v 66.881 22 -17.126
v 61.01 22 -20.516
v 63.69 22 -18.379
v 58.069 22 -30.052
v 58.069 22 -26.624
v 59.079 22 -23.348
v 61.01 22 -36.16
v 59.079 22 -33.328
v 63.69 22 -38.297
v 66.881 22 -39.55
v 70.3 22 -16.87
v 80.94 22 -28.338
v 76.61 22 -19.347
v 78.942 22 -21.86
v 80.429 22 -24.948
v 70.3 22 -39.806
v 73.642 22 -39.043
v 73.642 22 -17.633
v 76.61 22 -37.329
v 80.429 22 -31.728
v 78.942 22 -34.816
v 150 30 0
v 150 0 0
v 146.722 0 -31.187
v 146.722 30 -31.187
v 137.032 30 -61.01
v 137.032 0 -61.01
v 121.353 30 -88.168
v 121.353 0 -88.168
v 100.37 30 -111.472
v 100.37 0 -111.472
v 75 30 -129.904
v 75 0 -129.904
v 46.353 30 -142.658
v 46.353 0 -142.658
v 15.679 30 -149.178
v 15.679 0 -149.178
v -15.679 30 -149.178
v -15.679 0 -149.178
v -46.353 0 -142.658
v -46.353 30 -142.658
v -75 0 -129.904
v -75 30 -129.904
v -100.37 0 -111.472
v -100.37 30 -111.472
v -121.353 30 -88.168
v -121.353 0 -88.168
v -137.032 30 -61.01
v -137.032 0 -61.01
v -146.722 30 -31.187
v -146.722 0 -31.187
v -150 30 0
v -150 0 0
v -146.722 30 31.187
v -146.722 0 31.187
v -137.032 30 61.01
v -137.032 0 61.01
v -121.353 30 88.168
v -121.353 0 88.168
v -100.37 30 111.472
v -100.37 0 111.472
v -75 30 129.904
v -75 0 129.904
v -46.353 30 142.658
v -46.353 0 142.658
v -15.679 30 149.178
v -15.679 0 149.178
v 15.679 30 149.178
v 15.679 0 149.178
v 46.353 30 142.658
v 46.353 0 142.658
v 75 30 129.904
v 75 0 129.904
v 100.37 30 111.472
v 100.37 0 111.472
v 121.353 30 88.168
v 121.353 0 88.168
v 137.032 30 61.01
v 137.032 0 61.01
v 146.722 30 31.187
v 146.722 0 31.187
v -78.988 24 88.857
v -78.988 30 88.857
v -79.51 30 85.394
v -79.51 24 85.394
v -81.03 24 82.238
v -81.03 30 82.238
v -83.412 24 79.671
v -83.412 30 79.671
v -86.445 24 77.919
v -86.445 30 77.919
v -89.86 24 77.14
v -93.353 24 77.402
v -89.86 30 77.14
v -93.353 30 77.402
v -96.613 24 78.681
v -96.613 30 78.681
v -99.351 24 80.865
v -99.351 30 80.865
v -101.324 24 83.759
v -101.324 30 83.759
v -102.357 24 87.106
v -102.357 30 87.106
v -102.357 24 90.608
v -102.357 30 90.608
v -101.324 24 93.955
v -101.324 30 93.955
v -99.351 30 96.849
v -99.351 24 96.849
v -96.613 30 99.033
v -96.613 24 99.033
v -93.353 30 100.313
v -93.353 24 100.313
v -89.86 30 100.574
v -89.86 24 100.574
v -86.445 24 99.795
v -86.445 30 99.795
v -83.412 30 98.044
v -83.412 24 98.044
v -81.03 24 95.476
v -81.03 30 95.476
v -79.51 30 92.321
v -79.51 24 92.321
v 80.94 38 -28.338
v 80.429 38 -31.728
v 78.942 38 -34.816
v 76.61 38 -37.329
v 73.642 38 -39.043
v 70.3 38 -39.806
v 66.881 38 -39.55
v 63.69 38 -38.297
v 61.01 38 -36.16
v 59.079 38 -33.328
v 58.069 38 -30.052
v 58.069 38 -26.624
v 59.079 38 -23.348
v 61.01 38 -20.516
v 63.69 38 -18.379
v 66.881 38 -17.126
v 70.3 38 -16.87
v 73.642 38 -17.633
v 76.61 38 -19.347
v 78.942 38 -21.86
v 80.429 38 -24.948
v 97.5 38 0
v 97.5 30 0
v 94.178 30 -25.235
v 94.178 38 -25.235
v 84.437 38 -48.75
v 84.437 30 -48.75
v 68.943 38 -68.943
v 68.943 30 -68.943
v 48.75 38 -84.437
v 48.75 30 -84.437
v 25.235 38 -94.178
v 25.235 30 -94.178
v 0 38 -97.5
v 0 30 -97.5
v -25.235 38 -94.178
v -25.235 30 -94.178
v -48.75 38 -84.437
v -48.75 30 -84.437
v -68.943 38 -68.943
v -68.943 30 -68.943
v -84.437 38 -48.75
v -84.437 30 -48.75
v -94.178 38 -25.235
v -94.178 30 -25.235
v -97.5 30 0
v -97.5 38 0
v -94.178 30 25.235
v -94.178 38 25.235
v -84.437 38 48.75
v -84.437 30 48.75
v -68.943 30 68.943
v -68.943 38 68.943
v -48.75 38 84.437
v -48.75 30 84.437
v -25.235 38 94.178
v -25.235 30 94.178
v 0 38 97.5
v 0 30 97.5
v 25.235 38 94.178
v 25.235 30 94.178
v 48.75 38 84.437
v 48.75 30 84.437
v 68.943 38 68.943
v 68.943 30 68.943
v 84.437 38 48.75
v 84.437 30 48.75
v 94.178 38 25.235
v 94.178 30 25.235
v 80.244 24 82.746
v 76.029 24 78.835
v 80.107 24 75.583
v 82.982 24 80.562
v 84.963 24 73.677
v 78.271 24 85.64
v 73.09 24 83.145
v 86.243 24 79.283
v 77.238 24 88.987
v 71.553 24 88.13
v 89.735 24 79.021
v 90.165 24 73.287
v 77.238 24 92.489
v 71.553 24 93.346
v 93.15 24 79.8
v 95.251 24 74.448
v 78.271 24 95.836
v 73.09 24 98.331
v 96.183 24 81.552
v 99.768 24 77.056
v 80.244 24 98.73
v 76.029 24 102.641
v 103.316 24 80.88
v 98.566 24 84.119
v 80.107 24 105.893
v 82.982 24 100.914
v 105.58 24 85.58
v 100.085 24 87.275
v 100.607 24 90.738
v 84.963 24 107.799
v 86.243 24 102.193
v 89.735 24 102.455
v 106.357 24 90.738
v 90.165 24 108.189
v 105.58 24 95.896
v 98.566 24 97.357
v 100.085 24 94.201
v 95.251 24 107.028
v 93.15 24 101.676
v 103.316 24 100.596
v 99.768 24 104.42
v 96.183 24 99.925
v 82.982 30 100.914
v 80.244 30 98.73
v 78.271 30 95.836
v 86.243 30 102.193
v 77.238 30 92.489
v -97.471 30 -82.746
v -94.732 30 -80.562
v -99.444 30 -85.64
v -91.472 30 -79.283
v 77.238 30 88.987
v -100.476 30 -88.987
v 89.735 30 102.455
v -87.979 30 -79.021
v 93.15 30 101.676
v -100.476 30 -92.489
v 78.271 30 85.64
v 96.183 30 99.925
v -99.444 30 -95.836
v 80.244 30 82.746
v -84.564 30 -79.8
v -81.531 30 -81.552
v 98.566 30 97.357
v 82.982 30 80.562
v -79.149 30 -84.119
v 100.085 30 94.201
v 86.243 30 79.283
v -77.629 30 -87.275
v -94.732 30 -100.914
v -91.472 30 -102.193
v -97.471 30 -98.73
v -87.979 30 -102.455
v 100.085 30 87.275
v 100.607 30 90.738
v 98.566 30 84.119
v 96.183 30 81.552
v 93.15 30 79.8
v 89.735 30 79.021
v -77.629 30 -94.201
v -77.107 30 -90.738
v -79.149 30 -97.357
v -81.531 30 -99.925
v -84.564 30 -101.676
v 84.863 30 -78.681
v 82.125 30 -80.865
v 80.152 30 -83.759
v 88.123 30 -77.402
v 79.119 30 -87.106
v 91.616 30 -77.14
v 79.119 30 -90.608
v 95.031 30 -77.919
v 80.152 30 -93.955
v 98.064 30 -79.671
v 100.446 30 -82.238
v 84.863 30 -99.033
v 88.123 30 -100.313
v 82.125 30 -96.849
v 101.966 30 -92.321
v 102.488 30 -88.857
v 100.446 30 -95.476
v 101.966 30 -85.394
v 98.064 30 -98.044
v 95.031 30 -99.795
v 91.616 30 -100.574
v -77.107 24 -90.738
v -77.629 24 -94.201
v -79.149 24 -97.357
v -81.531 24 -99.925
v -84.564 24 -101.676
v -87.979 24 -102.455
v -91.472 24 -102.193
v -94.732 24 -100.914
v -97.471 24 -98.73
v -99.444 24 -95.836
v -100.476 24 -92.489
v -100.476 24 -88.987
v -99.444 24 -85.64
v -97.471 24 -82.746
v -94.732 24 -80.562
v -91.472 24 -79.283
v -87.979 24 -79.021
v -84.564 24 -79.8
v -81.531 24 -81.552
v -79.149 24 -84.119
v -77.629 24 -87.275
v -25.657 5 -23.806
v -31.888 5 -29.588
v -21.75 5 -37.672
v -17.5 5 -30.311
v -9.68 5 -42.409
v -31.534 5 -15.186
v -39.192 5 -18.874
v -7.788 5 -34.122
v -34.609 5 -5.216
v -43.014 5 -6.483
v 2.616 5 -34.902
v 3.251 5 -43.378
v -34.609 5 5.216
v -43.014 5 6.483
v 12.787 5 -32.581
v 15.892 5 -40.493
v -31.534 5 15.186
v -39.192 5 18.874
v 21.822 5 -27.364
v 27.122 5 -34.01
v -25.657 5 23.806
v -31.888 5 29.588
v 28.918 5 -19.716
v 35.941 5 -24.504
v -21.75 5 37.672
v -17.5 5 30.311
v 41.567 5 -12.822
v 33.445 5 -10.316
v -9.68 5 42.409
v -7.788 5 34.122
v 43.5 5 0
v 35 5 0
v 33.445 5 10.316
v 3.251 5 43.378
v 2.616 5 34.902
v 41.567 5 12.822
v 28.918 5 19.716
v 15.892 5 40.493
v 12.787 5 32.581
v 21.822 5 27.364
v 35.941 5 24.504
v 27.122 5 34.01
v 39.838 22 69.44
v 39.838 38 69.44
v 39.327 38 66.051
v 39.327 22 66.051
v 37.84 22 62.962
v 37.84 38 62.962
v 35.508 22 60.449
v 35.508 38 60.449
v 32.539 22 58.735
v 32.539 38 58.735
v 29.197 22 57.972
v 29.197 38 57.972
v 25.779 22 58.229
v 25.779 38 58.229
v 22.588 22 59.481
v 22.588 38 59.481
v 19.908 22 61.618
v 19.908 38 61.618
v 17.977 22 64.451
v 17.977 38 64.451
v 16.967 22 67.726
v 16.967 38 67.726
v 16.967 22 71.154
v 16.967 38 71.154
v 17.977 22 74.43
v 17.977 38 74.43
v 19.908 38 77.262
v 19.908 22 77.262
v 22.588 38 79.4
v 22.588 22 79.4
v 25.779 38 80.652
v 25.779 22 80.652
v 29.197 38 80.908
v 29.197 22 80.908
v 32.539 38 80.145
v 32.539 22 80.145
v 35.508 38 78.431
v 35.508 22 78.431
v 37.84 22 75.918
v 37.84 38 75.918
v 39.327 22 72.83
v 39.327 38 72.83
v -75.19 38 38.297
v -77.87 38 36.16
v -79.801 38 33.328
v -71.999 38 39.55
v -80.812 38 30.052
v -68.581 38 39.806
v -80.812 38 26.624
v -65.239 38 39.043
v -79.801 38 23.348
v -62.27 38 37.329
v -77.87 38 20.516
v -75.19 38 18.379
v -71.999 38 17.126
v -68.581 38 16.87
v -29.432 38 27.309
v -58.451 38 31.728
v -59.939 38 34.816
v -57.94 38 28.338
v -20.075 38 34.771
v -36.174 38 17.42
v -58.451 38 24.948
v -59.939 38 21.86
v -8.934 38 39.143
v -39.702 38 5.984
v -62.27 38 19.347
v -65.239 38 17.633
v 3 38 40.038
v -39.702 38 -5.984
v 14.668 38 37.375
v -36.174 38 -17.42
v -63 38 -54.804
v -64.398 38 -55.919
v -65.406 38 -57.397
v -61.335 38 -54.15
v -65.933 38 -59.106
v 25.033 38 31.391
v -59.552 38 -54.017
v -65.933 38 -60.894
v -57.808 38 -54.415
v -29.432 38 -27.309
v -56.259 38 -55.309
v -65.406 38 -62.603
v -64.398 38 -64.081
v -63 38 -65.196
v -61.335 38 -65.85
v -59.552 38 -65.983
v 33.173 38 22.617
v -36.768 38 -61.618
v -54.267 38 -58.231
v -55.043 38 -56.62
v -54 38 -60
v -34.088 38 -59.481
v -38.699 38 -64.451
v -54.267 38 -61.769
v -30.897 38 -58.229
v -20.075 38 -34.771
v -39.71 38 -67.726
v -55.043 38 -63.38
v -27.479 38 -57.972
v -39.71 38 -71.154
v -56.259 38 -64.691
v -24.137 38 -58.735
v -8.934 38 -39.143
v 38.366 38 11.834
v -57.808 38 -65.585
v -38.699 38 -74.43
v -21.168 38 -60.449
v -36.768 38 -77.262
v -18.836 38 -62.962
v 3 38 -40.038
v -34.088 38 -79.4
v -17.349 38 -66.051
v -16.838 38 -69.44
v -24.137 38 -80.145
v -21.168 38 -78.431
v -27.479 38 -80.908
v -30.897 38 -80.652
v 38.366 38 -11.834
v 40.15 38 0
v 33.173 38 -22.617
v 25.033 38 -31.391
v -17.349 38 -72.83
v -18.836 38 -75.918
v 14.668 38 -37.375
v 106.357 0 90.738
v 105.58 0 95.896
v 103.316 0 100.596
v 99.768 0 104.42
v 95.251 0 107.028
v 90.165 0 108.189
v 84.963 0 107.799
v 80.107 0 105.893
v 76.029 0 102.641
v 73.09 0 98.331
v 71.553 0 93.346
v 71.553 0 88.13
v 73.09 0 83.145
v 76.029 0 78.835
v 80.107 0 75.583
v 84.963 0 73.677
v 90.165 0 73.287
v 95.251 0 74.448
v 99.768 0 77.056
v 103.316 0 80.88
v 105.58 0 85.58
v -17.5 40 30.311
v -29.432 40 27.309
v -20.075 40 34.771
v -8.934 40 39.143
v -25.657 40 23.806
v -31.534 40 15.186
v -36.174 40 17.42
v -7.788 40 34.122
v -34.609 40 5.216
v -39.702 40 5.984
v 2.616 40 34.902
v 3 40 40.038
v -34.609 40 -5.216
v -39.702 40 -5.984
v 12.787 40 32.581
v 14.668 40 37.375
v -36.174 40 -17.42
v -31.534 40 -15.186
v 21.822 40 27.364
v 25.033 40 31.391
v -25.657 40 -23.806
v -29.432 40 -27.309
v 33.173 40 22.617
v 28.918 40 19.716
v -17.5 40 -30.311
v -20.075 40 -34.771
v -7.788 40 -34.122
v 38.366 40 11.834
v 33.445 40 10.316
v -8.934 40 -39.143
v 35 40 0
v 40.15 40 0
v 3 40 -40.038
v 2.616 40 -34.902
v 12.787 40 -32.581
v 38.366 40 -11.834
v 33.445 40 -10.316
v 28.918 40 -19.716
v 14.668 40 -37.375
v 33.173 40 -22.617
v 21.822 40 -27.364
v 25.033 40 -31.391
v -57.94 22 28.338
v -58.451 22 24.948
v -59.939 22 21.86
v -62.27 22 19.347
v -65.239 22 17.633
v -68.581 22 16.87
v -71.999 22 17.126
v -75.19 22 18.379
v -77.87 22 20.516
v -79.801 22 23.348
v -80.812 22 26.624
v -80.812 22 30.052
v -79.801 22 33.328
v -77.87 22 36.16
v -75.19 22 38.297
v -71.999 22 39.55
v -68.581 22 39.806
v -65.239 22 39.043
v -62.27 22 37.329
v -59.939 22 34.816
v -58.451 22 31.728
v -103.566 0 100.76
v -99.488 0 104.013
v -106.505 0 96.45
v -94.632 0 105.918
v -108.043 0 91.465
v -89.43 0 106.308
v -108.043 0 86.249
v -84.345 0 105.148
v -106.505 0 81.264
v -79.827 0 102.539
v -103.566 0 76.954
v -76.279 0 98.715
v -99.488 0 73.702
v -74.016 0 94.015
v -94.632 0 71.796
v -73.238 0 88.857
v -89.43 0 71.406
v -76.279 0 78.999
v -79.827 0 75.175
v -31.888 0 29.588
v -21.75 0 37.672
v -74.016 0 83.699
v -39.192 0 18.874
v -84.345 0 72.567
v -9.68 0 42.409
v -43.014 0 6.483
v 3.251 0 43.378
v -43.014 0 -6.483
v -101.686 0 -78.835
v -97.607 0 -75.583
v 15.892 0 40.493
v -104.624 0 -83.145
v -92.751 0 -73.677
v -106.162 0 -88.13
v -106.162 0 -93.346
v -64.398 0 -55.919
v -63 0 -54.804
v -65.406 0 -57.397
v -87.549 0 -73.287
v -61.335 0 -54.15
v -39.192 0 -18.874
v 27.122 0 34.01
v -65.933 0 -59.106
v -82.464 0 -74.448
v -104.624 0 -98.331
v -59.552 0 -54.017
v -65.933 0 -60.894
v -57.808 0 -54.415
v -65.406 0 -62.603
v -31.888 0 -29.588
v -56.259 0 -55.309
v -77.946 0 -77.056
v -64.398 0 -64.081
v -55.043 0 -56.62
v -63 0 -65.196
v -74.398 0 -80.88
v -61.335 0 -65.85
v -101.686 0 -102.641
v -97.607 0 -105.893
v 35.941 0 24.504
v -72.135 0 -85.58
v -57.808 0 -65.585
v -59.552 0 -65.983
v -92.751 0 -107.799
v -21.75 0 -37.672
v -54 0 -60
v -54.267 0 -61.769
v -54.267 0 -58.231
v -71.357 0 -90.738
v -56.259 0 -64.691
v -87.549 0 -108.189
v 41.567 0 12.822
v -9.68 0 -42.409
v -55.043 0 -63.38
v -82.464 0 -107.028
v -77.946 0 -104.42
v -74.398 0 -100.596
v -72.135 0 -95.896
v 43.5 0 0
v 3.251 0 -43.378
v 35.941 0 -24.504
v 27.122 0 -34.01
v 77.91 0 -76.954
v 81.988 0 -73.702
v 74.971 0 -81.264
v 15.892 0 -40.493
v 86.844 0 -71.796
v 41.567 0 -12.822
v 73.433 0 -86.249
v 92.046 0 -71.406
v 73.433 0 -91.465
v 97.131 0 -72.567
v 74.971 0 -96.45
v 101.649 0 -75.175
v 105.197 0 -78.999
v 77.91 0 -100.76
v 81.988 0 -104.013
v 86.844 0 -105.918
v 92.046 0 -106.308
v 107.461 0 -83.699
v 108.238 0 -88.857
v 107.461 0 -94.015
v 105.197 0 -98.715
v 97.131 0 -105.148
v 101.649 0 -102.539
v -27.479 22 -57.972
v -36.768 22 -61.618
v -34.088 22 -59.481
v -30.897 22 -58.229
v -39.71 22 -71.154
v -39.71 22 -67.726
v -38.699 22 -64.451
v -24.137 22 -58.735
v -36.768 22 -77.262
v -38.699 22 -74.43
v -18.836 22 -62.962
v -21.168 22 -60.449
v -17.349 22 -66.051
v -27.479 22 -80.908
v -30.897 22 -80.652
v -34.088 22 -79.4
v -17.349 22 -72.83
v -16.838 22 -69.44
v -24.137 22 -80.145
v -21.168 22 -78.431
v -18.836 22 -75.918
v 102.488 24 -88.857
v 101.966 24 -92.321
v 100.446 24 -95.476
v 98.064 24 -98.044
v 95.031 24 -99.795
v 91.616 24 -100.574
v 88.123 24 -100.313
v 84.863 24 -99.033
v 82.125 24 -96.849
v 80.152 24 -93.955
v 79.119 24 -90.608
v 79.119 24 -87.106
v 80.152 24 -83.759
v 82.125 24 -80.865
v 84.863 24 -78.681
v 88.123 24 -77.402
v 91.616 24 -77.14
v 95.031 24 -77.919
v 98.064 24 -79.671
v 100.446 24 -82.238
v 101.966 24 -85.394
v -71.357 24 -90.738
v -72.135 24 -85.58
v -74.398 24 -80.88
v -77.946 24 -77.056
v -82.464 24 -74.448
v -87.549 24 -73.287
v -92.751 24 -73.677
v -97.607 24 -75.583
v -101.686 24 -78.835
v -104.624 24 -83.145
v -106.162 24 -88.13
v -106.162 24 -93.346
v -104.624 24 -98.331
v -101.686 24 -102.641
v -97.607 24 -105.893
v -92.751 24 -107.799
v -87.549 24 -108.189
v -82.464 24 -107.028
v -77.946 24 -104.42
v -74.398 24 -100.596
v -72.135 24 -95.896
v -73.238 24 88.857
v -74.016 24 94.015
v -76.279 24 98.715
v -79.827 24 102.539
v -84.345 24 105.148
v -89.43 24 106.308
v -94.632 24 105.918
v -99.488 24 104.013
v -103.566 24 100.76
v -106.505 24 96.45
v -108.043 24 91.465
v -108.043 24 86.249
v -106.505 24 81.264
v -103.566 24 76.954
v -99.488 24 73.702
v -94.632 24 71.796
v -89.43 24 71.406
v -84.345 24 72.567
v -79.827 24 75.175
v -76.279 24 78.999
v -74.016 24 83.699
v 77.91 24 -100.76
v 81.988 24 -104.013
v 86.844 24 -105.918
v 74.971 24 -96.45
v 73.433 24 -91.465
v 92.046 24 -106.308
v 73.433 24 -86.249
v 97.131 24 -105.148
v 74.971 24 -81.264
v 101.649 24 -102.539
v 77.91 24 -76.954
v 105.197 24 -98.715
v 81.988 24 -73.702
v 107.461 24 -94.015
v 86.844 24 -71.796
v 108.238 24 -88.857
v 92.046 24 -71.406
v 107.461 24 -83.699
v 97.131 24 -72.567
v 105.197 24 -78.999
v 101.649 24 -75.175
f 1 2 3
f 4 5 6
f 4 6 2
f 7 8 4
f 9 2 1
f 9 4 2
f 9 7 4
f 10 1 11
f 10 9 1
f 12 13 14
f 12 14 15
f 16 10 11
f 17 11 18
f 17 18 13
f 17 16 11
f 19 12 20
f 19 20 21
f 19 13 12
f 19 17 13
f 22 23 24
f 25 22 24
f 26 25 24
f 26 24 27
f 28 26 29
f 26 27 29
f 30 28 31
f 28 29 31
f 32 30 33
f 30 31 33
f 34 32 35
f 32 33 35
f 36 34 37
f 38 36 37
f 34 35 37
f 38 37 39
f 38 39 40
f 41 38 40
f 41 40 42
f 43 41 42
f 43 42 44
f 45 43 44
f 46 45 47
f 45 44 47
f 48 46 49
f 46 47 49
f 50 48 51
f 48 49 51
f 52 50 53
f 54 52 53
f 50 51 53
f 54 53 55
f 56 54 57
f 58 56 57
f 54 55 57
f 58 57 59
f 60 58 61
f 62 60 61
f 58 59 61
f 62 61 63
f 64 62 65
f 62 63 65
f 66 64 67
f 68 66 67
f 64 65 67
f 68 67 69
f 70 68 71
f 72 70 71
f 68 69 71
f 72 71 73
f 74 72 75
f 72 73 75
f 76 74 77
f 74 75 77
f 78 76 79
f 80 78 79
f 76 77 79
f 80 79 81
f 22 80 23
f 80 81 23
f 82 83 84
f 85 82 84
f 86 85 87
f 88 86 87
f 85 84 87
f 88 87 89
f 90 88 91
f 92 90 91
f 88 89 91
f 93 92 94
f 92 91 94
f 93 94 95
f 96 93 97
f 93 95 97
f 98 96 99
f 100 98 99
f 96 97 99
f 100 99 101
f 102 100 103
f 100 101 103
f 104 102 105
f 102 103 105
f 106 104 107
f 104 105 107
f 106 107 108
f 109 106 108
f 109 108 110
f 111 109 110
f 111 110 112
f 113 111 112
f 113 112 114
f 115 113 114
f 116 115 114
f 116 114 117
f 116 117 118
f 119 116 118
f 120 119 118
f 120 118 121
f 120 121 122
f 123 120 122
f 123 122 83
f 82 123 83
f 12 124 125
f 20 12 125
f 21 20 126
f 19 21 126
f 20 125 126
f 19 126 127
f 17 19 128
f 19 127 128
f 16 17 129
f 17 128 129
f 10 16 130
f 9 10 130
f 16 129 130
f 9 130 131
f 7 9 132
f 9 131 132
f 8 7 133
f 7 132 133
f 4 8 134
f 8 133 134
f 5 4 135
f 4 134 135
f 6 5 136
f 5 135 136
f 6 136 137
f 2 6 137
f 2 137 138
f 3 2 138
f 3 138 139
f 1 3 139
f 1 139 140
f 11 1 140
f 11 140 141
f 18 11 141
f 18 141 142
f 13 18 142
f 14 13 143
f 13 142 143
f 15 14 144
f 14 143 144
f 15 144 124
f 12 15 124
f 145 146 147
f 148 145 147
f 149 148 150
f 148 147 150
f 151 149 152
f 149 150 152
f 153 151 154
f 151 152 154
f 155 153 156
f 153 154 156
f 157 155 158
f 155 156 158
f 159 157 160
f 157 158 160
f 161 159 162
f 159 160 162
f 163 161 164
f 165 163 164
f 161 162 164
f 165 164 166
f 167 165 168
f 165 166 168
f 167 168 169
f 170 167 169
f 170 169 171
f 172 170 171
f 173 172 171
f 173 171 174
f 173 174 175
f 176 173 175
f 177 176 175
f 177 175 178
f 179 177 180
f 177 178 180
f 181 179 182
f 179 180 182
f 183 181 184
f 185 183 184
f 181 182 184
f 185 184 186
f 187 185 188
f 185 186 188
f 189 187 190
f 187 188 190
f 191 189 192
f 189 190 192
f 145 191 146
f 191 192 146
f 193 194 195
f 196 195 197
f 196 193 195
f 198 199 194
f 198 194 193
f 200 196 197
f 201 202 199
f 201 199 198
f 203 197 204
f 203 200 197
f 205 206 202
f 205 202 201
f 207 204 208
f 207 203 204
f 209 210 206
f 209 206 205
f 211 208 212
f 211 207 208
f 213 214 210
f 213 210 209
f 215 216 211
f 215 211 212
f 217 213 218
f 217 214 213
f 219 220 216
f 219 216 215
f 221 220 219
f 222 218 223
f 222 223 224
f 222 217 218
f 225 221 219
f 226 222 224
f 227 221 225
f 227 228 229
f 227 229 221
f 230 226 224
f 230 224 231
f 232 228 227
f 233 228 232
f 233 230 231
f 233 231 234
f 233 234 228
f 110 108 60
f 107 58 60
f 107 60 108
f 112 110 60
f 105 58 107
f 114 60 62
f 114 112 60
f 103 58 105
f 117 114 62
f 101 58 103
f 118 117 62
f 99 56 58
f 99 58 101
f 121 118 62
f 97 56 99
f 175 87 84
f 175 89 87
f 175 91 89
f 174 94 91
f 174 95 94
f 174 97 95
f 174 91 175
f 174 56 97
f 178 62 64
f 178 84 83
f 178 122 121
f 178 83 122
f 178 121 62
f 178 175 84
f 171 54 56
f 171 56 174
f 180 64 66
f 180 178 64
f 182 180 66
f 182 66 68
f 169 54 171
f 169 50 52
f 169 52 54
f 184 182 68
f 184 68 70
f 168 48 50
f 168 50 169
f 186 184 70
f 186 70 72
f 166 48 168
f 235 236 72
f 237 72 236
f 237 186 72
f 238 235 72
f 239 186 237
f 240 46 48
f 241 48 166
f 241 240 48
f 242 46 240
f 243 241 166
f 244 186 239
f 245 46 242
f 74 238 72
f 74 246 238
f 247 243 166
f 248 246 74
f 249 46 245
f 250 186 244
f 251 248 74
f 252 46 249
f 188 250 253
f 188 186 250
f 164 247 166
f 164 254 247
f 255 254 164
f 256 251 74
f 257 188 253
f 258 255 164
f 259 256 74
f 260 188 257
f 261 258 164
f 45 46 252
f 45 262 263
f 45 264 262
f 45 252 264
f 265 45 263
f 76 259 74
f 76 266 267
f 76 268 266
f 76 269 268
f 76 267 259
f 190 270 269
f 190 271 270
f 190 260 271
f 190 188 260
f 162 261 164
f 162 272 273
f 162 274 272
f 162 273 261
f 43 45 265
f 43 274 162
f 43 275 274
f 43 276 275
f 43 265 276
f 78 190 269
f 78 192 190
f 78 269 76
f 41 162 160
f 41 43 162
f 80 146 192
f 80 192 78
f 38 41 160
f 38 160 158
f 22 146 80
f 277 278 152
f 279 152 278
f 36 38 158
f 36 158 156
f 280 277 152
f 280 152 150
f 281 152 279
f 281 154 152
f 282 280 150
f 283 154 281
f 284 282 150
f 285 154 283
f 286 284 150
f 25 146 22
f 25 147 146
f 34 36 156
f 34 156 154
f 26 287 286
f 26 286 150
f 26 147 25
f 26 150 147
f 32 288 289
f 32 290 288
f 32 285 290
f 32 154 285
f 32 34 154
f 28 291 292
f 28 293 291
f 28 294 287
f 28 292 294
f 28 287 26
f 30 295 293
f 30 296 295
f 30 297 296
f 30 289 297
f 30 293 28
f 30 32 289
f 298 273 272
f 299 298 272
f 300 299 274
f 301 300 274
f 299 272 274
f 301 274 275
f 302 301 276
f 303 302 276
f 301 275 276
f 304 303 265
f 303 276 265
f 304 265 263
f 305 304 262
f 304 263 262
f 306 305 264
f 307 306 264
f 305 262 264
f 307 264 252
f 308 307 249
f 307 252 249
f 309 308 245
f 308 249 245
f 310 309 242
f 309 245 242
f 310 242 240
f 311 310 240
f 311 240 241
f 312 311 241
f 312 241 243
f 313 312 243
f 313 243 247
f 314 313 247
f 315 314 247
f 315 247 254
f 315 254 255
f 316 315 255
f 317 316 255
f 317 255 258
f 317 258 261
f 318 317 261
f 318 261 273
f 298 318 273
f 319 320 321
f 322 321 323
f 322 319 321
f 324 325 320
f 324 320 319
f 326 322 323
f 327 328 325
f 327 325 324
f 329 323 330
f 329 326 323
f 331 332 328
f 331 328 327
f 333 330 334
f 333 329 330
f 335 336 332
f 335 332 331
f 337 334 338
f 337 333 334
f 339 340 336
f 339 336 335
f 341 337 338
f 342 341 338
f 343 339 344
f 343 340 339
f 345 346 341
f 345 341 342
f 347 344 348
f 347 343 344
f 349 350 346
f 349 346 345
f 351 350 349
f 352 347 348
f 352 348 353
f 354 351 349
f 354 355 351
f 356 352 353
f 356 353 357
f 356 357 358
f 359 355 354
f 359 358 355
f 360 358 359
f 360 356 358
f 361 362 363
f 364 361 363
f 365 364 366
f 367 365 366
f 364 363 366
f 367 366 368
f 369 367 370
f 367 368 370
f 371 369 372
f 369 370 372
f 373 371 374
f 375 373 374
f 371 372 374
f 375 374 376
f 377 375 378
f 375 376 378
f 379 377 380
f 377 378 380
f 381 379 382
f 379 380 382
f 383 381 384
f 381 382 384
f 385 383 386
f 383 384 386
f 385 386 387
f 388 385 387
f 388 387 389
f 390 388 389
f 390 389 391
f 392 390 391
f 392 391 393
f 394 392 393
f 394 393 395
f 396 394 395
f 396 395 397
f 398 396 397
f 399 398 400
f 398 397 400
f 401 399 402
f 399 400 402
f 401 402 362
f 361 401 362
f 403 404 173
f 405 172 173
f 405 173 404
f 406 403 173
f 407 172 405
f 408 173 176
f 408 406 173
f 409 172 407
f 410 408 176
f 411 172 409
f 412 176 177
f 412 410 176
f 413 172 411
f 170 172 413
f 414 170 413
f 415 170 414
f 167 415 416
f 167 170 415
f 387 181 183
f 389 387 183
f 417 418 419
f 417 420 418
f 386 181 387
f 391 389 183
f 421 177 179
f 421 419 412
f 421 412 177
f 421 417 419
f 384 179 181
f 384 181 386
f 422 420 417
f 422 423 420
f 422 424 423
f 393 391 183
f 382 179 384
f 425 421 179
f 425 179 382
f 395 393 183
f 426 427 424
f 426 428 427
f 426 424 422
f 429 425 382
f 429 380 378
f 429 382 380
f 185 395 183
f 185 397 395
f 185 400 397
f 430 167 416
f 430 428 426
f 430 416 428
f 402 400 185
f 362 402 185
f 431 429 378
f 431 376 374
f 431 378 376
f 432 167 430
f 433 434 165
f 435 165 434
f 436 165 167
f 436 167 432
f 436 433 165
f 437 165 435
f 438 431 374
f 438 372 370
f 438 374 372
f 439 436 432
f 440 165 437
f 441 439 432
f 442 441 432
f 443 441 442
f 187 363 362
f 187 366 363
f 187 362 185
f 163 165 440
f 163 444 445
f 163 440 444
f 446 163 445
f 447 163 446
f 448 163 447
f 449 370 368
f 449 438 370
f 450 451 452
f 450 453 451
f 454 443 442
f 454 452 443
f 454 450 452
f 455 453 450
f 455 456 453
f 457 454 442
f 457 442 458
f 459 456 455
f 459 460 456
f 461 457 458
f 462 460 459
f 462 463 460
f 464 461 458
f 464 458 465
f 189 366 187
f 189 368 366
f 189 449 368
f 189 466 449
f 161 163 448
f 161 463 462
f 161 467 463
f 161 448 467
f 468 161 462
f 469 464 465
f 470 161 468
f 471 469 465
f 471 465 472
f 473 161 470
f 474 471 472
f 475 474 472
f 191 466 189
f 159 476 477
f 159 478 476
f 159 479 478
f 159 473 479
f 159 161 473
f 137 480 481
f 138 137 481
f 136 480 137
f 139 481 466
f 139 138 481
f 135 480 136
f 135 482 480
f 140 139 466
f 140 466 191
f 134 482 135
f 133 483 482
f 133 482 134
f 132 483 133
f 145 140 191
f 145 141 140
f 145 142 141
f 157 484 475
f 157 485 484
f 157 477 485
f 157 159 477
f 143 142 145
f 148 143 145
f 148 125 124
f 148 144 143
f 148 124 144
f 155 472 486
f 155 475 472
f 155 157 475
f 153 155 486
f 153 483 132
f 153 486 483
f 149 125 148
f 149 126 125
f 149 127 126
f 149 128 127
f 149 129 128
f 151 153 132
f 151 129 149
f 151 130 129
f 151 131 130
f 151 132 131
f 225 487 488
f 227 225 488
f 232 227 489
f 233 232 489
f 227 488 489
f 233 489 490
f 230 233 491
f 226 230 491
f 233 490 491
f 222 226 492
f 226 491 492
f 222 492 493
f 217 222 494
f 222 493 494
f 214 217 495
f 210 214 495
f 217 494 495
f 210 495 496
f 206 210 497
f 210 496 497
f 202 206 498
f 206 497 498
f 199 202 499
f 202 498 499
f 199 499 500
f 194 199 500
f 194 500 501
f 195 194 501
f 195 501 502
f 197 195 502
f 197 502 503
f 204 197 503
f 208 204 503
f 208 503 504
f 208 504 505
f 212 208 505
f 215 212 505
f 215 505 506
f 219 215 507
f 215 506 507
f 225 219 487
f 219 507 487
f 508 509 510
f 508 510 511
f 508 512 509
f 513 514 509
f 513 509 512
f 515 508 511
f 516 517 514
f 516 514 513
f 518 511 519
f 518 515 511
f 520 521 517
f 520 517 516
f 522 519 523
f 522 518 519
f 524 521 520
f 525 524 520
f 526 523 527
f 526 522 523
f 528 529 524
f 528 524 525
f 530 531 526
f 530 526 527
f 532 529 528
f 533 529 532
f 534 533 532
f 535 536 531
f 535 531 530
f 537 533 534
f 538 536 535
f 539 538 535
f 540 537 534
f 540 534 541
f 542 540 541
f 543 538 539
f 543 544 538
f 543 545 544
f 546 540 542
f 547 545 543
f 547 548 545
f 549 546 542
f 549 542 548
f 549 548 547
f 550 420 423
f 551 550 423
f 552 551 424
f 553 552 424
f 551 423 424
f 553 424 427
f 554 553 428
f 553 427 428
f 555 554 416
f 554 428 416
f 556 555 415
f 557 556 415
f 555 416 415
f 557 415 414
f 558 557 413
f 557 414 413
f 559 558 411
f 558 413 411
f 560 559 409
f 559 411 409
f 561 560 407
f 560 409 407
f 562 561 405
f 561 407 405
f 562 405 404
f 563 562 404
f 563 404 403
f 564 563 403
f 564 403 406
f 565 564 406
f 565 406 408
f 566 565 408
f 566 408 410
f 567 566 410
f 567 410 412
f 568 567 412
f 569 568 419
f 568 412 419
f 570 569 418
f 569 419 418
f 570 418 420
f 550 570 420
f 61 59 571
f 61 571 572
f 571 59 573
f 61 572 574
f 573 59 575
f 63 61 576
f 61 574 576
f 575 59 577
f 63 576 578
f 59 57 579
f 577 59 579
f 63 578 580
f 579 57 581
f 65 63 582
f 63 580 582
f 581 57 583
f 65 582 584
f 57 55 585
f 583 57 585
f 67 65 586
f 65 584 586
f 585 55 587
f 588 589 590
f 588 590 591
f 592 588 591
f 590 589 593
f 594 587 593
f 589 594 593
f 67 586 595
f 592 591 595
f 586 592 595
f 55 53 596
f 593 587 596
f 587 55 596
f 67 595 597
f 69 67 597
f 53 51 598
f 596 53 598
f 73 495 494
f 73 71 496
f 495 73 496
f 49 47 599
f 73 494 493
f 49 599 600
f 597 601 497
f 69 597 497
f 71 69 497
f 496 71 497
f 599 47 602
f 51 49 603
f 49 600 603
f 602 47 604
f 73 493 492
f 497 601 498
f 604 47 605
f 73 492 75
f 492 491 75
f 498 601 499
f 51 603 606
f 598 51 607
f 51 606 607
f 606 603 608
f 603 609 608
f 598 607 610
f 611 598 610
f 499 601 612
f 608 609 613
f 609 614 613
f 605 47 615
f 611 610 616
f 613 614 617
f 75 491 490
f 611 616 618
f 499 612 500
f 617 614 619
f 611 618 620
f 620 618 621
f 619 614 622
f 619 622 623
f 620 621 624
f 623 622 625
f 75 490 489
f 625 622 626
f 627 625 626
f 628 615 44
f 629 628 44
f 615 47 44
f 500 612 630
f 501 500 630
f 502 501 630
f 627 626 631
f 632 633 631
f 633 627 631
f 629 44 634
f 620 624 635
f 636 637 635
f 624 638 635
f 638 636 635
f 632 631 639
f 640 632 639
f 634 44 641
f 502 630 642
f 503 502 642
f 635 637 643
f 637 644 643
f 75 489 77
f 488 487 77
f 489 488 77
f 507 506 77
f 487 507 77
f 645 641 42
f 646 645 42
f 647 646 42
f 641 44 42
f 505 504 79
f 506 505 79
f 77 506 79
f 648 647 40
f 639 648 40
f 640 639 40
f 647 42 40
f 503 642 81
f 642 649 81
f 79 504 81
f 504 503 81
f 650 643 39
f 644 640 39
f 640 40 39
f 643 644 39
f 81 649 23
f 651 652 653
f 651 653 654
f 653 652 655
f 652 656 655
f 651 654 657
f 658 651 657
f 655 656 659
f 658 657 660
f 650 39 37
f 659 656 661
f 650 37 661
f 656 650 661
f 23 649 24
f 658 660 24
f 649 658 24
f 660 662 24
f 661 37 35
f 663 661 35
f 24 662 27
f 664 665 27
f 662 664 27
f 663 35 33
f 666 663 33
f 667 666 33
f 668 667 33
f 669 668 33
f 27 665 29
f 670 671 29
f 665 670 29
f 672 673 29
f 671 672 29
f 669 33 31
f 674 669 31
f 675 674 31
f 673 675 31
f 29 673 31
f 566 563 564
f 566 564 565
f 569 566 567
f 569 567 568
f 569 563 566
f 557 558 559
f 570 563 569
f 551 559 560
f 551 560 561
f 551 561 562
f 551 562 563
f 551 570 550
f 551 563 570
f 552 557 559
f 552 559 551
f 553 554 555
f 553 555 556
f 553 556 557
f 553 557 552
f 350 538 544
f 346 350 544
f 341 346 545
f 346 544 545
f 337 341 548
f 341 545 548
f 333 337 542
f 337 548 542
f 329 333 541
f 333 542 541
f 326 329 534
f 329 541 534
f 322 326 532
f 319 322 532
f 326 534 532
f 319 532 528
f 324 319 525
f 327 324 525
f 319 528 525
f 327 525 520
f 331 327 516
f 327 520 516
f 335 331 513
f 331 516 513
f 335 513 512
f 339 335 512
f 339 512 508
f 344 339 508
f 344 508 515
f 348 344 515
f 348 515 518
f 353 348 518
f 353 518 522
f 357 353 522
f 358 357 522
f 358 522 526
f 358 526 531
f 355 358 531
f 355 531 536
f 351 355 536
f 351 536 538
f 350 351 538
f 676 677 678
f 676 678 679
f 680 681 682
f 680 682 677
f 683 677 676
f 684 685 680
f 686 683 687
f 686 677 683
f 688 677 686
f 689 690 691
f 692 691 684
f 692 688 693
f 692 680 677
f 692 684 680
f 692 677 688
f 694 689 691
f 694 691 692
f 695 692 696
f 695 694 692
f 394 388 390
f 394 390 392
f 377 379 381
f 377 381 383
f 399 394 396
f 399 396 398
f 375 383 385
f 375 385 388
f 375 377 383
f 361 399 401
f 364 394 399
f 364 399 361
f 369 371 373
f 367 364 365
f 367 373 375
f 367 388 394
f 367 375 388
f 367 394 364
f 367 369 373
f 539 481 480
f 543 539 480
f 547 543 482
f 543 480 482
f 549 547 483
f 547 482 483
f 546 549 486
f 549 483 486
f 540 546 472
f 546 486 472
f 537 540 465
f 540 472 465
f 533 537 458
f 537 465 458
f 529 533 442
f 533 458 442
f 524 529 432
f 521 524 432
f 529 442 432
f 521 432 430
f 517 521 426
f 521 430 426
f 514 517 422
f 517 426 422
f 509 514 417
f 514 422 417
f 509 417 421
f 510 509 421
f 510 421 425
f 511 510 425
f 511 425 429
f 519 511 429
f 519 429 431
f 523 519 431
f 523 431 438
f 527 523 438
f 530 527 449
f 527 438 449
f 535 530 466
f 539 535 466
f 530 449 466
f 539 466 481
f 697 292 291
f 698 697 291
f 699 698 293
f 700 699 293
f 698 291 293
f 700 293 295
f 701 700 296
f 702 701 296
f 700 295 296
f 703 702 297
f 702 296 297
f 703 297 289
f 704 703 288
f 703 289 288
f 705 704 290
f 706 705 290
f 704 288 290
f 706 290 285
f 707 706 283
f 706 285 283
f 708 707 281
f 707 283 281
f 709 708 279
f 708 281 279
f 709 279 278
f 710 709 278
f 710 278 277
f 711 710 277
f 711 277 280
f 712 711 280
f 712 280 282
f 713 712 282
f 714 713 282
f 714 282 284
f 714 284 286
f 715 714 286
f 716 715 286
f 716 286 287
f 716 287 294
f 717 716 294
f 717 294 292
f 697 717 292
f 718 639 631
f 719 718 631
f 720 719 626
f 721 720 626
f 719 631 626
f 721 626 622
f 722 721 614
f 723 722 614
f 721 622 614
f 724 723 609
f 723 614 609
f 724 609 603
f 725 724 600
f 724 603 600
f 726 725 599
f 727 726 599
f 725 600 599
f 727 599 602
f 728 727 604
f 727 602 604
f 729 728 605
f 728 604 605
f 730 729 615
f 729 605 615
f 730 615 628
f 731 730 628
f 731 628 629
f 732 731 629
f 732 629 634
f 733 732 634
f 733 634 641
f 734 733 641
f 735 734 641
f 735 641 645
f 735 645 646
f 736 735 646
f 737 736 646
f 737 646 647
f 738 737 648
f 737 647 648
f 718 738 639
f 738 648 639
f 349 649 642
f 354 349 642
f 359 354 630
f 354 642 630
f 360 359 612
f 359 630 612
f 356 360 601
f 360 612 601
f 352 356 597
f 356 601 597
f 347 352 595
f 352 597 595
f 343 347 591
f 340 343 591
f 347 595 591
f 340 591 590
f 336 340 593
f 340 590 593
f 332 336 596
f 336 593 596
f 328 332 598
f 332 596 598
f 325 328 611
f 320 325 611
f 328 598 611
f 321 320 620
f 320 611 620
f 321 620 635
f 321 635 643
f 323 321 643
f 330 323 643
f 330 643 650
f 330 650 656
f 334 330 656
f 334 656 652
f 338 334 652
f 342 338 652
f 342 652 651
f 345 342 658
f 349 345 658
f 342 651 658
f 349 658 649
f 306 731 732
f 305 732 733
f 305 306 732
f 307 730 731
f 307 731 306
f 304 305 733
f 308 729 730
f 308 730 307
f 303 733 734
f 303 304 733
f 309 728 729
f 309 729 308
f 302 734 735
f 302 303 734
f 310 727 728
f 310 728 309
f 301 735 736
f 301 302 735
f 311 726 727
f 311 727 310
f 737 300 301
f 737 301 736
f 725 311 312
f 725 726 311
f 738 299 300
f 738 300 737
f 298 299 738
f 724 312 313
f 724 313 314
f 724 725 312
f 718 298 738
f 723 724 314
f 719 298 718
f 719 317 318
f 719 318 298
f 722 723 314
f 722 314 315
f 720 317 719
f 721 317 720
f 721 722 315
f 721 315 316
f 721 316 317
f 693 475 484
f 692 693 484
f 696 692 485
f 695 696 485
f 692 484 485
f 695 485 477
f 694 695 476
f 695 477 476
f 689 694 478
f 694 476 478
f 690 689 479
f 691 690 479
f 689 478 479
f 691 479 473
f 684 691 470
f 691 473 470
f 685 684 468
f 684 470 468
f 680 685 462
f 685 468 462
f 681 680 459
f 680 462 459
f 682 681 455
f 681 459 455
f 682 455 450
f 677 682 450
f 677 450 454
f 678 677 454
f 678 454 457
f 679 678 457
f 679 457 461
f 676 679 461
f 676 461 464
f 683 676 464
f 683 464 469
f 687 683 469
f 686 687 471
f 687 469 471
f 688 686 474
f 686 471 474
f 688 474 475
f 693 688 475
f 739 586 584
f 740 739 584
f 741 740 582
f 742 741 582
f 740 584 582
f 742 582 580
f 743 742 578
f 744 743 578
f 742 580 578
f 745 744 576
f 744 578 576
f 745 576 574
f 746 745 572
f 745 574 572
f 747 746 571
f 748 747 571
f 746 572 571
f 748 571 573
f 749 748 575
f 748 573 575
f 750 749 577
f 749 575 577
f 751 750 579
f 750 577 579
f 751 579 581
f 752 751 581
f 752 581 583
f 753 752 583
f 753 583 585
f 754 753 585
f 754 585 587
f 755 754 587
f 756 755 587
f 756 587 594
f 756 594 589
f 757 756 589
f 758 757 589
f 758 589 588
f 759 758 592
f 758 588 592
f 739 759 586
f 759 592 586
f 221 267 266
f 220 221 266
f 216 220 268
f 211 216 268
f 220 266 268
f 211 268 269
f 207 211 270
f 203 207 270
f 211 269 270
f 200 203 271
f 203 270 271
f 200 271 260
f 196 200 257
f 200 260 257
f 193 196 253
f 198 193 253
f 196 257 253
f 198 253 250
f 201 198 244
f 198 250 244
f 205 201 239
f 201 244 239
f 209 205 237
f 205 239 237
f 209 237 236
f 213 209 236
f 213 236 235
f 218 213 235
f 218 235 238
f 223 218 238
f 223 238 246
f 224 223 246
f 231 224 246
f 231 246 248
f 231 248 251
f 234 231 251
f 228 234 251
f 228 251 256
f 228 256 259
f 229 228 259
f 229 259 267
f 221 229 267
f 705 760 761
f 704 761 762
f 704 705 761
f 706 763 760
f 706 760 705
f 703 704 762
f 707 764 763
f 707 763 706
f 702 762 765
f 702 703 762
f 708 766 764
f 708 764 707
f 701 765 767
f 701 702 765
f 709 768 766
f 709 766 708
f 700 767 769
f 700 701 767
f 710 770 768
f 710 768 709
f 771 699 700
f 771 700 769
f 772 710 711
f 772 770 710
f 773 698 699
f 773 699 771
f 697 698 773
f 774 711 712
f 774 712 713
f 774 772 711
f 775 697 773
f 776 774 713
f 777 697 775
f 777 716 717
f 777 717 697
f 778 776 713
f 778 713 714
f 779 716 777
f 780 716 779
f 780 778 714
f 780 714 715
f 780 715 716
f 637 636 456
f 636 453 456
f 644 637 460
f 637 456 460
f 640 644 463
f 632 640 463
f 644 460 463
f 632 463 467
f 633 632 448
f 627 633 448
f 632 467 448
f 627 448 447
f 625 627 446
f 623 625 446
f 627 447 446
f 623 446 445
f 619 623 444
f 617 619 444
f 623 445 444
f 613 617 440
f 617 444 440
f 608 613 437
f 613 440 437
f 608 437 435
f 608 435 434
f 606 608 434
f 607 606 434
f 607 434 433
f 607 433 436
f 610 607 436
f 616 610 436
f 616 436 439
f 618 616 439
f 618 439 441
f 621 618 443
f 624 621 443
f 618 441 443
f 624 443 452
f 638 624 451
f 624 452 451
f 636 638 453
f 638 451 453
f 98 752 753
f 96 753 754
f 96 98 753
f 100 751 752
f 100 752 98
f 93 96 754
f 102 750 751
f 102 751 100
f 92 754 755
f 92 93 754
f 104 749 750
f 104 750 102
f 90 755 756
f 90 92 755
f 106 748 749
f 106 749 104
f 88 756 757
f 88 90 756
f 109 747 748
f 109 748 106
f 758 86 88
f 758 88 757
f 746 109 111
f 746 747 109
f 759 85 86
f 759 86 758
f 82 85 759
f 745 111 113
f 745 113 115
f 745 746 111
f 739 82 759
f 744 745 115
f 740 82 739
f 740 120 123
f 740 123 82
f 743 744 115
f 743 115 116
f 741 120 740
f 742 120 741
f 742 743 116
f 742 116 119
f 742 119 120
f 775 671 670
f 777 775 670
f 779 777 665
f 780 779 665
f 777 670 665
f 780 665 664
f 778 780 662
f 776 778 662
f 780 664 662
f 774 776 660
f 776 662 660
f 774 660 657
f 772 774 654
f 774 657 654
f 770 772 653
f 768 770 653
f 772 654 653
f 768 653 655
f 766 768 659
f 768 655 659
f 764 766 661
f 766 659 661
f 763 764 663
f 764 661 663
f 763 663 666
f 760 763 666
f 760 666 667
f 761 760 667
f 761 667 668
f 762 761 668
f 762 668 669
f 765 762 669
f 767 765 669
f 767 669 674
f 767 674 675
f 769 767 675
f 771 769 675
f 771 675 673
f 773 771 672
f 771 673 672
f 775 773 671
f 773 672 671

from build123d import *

# Parameters (mm, degrees)
IZIM1_R                     = 150
Y_KSEKLIK_EKSTR_ZYON1_DEPTH = 30
IZIM2_R                     = 97.5
Y_KSEKLIK_EKSTR_ZYON2_DEPTH = 8
IZIM3_R                     = 40.15
Y_KSEKLIK_EKSTR_ZYON3_DEPTH = 2
IZIM4_R                     = 35
KES_EKSTR_ZYON1_DEPTH       = 41
IZIM5_R                     = 43.5
KES_EKSTR_ZYON2_DEPTH       = 5
IZIM6_R                     = 11.5
IZIM6_R_2                   = 6
KES_EKSTR_ZYON4_DEPTH       = 16
IZIM7_R                     = 11.75
KES_EKSTR_ZYON5_DEPTH       = 31
IZIM8_R                     = 6
KES_EKSTR_ZYON6_DEPTH       = 23
IZIM9_R                     = 17.5
KES_EKSTR_ZYON7_DEPTH       = 24


with BuildPart() as part:
    # Çizim1 → Yükseklik-Ekstrüzyon1 (new body)
    with BuildSketch(Plane(origin=(0, 0, 0), x_dir=(1, 0, 0), z_dir=(0, 1, 0))):
        Circle(IZIM1_R)
    extrude(amount=Y_KSEKLIK_EKSTR_ZYON1_DEPTH)

    # Çizim2 → Yükseklik-Ekstrüzyon2 (add)
    with BuildSketch(Plane(origin=(0, 30, 0), x_dir=(1, 0, 0), z_dir=(0, 1, 0))):
        Circle(IZIM2_R)
    extrude(amount=Y_KSEKLIK_EKSTR_ZYON2_DEPTH)

    # Çizim3 → Yükseklik-Ekstrüzyon3 (add)
    with BuildSketch(Plane(origin=(0, 38, 0), x_dir=(1, 0, 0), z_dir=(0, 1, 0))):
        Circle(IZIM3_R)
    extrude(amount=Y_KSEKLIK_EKSTR_ZYON3_DEPTH)

    # Çizim4 → Kes-Ekstrüzyon1 (cut, through all)
    with BuildSketch(Plane(origin=(0, 40, 0), x_dir=(1, 0, 0), z_dir=(0, 1, 0))):
        Circle(IZIM4_R)
    extrude(amount=-KES_EKSTR_ZYON1_DEPTH, mode=Mode.SUBTRACT)

    # Çizim5 → Kes-Ekstrüzyon2 (cut)
    with BuildSketch(Plane.XZ):
        Circle(IZIM5_R)
    extrude(amount=-KES_EKSTR_ZYON2_DEPTH, mode=Mode.SUBTRACT)

    # Çizim6 → Kes-Ekstrüzyon4 (cut)
    with BuildSketch(Plane(origin=(0, 38, 0), x_dir=(1, 0, 0), z_dir=(0, 1, 0))):
        with Locations((-28.338059011, 69.440293861)):
            Circle(IZIM6_R)
        with Locations((69.440293861, 28.338059011)):
            Circle(IZIM6_R)
        with Locations((28.338059011, -69.440293861)):
            Circle(IZIM6_R)
        with Locations((-69.440293861, -28.338059011)):
            Circle(IZIM6_R)
        with Locations((-60, 60)):
            Circle(IZIM6_R_2)
    extrude(amount=-KES_EKSTR_ZYON4_DEPTH, mode=Mode.SUBTRACT)

    # Çizim7 → Kes-Ekstrüzyon5 (cut, through all)
    with BuildSketch(Plane(origin=(0, 30, 0), x_dir=(1, 0, 0), z_dir=(0, 1, 0))):
        with Locations((-88.857244245, 90.738030313)):
            Circle(IZIM7_R)
        with Locations((90.738030313, 88.857244245)):
            Circle(IZIM7_R)
        with Locations((88.857244245, -90.738030313)):
            Circle(IZIM7_R)
        with Locations((-90.738030313, -88.857244245)):
            Circle(IZIM7_R)
    extrude(amount=-KES_EKSTR_ZYON5_DEPTH, mode=Mode.SUBTRACT)

    # Çizim8 → Kes-Ekstrüzyon6 (cut, through all)
    with BuildSketch(Plane(origin=(0, 22, 0), x_dir=(1, 0, 0), z_dir=(0, 1, 0))):
        with Locations((-60, 60)):
            Circle(IZIM8_R)
    extrude(amount=-KES_EKSTR_ZYON6_DEPTH, mode=Mode.SUBTRACT)

    # Çizim9 → Kes-Ekstrüzyon7 (cut)
    with BuildSketch(Plane.XZ):
        with Locations((-90.738030313, 88.857244245)):
            Circle(IZIM9_R)
        with Locations((88.857244245, 90.738030313)):
            Circle(IZIM9_R)
        with Locations((90.738030313, -88.857244245)):
            Circle(IZIM9_R)
        with Locations((-88.857244245, -90.738030313)):
            Circle(IZIM9_R)
    extrude(amount=-KES_EKSTR_ZYON7_DEPTH, mode=Mode.SUBTRACT)


solid = part.part
